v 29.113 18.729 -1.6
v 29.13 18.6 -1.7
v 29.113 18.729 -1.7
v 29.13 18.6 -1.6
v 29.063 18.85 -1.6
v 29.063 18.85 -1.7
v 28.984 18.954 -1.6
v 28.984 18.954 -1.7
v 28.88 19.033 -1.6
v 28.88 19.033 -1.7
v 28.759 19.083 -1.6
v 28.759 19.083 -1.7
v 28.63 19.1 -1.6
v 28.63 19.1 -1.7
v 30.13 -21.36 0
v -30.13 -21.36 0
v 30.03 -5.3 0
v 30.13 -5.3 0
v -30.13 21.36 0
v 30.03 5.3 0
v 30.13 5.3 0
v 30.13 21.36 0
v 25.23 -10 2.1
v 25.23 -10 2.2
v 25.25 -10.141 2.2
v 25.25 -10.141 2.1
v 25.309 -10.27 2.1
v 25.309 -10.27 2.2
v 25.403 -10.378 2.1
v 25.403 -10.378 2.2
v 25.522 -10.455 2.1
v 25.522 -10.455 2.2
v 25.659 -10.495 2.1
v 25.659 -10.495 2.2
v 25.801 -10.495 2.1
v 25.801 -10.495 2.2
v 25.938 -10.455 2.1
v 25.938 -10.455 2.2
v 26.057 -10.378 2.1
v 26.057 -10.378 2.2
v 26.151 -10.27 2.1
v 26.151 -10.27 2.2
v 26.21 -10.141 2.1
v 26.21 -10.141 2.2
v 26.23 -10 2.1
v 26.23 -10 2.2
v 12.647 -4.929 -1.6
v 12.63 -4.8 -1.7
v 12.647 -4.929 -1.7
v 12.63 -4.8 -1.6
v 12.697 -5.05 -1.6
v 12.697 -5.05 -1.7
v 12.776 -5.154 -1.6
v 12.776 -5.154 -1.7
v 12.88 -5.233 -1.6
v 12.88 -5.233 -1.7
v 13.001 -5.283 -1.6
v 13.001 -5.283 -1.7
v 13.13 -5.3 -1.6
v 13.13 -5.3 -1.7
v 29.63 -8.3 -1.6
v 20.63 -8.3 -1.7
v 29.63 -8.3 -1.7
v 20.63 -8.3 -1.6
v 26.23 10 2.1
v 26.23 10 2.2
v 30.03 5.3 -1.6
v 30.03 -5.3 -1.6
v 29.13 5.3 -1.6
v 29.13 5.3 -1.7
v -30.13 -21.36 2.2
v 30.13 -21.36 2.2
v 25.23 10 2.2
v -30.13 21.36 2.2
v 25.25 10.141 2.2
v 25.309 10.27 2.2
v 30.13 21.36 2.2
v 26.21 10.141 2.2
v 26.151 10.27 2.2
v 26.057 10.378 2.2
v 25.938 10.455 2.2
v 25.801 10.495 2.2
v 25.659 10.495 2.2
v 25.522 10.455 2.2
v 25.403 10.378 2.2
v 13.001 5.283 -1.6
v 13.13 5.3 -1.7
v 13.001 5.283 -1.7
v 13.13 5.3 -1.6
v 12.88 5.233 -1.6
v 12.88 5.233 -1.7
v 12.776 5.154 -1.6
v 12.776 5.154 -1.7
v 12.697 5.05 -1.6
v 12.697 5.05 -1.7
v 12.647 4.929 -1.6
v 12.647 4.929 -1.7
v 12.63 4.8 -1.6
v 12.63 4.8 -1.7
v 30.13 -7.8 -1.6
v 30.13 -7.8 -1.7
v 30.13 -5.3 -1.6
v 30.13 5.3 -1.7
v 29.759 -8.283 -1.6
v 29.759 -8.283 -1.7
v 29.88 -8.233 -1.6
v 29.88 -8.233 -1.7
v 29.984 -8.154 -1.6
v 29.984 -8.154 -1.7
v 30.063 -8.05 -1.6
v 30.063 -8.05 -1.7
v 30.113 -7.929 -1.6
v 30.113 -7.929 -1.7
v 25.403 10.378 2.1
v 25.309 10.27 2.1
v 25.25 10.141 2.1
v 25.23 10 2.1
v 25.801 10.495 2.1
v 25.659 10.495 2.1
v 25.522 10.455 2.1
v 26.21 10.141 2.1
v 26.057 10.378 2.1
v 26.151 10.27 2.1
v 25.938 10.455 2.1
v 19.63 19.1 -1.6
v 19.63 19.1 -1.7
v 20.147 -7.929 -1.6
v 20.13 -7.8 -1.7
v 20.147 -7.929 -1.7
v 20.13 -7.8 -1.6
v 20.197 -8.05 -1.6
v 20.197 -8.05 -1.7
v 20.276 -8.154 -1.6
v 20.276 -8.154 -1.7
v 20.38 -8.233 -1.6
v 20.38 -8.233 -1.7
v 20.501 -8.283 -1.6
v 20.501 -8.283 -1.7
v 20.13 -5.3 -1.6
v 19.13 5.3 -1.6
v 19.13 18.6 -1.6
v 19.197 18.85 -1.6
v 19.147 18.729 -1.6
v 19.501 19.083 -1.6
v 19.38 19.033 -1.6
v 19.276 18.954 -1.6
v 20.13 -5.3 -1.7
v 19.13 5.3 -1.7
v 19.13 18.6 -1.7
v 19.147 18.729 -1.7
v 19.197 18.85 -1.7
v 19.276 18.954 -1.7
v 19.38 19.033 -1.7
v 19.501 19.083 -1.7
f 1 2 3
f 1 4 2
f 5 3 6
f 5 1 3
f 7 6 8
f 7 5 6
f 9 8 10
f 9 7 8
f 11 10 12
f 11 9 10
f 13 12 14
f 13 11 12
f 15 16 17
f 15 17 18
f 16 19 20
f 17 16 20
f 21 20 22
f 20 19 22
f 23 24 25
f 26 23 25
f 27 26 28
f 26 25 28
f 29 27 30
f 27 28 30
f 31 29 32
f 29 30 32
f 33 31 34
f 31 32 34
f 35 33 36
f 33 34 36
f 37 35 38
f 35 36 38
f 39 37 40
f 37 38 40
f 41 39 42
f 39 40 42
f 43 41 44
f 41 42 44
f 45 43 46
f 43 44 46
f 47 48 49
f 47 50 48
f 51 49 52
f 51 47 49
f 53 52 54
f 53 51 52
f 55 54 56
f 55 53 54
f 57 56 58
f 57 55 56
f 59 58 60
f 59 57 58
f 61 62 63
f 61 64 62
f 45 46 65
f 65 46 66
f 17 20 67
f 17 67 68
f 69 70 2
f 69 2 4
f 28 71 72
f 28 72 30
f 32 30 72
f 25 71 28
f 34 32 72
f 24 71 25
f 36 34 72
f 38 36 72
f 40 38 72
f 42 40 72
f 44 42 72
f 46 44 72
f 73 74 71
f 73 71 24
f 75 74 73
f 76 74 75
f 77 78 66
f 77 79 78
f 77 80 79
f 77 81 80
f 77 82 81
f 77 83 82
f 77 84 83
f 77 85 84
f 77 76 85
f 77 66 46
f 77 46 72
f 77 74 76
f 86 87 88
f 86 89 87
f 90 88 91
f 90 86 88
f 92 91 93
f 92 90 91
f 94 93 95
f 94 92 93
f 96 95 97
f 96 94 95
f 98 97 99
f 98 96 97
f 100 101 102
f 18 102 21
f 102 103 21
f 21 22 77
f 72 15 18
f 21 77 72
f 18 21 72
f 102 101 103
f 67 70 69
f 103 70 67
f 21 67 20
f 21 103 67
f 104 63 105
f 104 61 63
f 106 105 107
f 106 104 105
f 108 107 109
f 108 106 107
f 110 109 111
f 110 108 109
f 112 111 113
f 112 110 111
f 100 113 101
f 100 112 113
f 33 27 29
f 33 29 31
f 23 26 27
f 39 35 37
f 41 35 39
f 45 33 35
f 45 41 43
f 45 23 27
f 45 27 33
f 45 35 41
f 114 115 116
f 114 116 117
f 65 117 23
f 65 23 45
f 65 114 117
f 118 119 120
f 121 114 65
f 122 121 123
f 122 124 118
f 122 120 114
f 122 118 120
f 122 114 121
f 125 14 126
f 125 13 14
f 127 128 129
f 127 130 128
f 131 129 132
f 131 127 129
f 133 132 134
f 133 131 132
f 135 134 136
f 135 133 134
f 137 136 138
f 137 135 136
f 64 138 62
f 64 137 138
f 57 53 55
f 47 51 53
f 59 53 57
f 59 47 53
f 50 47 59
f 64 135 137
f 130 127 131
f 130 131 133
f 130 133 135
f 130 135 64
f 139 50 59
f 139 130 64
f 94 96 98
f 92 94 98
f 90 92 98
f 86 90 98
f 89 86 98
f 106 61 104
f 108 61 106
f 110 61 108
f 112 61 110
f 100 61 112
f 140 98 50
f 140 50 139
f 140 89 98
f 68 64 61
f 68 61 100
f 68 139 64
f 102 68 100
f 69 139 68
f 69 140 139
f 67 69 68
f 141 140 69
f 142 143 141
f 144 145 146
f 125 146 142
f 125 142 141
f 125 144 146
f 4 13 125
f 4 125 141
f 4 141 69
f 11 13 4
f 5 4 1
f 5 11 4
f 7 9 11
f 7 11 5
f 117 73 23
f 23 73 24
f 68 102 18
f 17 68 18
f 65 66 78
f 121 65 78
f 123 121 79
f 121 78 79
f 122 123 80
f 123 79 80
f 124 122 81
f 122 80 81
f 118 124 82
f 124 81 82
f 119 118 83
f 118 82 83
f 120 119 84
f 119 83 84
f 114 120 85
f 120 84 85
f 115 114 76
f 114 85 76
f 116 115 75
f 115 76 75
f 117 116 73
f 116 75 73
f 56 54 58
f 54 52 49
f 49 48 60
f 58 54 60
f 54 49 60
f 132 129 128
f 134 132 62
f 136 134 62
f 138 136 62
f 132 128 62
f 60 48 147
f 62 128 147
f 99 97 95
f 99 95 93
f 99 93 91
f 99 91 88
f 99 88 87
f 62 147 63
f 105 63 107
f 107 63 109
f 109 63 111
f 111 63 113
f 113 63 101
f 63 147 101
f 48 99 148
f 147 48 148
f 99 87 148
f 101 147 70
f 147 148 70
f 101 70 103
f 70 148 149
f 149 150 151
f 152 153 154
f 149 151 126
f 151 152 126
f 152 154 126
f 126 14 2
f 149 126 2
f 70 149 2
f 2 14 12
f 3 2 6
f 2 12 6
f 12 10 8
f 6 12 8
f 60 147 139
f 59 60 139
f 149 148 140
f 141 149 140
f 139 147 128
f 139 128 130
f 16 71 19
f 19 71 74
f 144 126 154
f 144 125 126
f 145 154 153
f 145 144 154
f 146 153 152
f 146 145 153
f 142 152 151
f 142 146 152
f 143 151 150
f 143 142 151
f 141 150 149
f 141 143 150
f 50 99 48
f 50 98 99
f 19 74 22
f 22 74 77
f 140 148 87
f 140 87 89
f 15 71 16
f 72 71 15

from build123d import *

# Parameters (mm, degrees)
SKETCH_W     = 57.26
SKETCH_H     = 40.62
PAD_DEPTH    = 2.2
SKETCH001_W  = 60.26
SKETCH001_H  = 42.72
PAD001_DEPTH = 2.2
SKETCH002_W  = 0.1
SKETCH002_H  = 10.6
PAD002_DEPTH = 1.7
SKETCH003_W  = 10.6
SKETCH003_H  = 0.1
PAD003_DEPTH = 17.4
SKETCH004_W  = 49.66
SKETCH004_H  = 37.42
PAD004_DEPTH = 1
FILLET_R     = 0.5
SKETCH005_W  = 10
SKETCH005_H  = 0.1
PAD005_DEPTH = 13.8
FILLET001_R  = 0.5
SKETCH006_W  = 10
SKETCH006_H  = 0.1
PAD006_DEPTH = 3
POCKET_DEPTH = 0.1
FILLET002_R  = 0.5
FILLET003_R  = 0.5


with BuildPart() as part:
    # Sketch → Pad (new body)
    with BuildSketch(Plane.XY):
        Rectangle(SKETCH_W, SKETCH_H)
    extrude(amount=PAD_DEPTH)

    # Sketch001 (on Face6 of Pad) → Pad001 (join)
    with BuildSketch(Plane.XY.offset(2.2)):
        Rectangle(SKETCH001_W, SKETCH001_H)
    extrude(amount=-PAD001_DEPTH)

    # Sketch002 (on Face5 of Pad001) → Pad002 (join)
    with BuildSketch(Plane(origin=(0, 0, 0), x_dir=(1, 0, 0), z_dir=(0, 0, -1))):
        with Locations((30.08, 0)):
            Rectangle(SKETCH002_W, SKETCH002_H)
    extrude(amount=PAD002_DEPTH)

    # Sketch003 (on Face10 of Pad002) → Pad003 (join)
    with BuildSketch(Plane(origin=(30.03, 0, 0), x_dir=(0, -1, 0), z_dir=(-1, 0, 0))):
        with Locations((0, -1.65)):
            Rectangle(SKETCH003_W, SKETCH003_H)
    extrude(amount=PAD003_DEPTH)

    # Sketch004 (on Face8 of Pad003) → Pad004 (join)
    with BuildSketch(Plane.XY.offset(2.2)):
        with Locations((-2.2, 0)):
            Rectangle(SKETCH004_W, SKETCH004_H)
    extrude(amount=-PAD004_DEPTH)

    # Fillet
    fillet_edges = [part.edges().sort_by_distance(p)[0] for p in [
        (12.63, -5.3, -1.65),
        (12.63, 5.3, -1.65),
    ]]
    fillet(fillet_edges, radius=FILLET_R)

    # Sketch005 (on Face1 of Fillet) → Pad005 (join)
    with BuildSketch(Plane(origin=(0, 5.3, 0), x_dir=(-1, 0, 0), z_dir=(0, 1, 0))):
        with Locations((-24.13, -1.65)):
            Rectangle(SKETCH005_W, SKETCH005_H)
    extrude(amount=PAD005_DEPTH)

    # Fillet001
    fillet001_edges = [part.edges().sort_by_distance(p)[0] for p in [
        (19.13, 19.1, -1.65),
        (29.13, 19.1, -1.65),
    ]]
    fillet(fillet001_edges, radius=FILLET001_R)

    # Sketch006 (on Face16 of Fillet001) → Pad006 (join)
    with BuildSketch(Plane.XZ.offset(5.3)):
        with Locations((25.13, -1.65)):
            Rectangle(SKETCH006_W, SKETCH006_H)
    extrude(amount=PAD006_DEPTH)

    # Sketch007 (on Face33 of Pad006) → Pocket (cut)
    with BuildSketch(Plane.XY.offset(2.2)):
        with BuildLine():
            ThreePointArc((26.23, 10), (25.73, 10.5), (25.23, 10))
            Line((25.23, 10), (25.23, -10))
            ThreePointArc((25.23, -10), (25.73, -10.5), (26.23, -10))
            Line((26.23, -10), (26.23, 10))
        make_face()
    extrude(amount=-POCKET_DEPTH, mode=Mode.SUBTRACT)

    # Fillet002
    fillet002_edges = [part.edges().sort_by_distance(p)[0] for p in [
        (20.13, -8.3, -1.65),
    ]]
    fillet(fillet002_edges, radius=FILLET002_R)

    # Fillet003
    fillet003_edges = [part.edges().sort_by_distance(p)[0] for p in [
        (30.13, -8.3, -1.65),
    ]]
    fillet(fillet003_edges, radius=FILLET003_R)


solid = part.part
